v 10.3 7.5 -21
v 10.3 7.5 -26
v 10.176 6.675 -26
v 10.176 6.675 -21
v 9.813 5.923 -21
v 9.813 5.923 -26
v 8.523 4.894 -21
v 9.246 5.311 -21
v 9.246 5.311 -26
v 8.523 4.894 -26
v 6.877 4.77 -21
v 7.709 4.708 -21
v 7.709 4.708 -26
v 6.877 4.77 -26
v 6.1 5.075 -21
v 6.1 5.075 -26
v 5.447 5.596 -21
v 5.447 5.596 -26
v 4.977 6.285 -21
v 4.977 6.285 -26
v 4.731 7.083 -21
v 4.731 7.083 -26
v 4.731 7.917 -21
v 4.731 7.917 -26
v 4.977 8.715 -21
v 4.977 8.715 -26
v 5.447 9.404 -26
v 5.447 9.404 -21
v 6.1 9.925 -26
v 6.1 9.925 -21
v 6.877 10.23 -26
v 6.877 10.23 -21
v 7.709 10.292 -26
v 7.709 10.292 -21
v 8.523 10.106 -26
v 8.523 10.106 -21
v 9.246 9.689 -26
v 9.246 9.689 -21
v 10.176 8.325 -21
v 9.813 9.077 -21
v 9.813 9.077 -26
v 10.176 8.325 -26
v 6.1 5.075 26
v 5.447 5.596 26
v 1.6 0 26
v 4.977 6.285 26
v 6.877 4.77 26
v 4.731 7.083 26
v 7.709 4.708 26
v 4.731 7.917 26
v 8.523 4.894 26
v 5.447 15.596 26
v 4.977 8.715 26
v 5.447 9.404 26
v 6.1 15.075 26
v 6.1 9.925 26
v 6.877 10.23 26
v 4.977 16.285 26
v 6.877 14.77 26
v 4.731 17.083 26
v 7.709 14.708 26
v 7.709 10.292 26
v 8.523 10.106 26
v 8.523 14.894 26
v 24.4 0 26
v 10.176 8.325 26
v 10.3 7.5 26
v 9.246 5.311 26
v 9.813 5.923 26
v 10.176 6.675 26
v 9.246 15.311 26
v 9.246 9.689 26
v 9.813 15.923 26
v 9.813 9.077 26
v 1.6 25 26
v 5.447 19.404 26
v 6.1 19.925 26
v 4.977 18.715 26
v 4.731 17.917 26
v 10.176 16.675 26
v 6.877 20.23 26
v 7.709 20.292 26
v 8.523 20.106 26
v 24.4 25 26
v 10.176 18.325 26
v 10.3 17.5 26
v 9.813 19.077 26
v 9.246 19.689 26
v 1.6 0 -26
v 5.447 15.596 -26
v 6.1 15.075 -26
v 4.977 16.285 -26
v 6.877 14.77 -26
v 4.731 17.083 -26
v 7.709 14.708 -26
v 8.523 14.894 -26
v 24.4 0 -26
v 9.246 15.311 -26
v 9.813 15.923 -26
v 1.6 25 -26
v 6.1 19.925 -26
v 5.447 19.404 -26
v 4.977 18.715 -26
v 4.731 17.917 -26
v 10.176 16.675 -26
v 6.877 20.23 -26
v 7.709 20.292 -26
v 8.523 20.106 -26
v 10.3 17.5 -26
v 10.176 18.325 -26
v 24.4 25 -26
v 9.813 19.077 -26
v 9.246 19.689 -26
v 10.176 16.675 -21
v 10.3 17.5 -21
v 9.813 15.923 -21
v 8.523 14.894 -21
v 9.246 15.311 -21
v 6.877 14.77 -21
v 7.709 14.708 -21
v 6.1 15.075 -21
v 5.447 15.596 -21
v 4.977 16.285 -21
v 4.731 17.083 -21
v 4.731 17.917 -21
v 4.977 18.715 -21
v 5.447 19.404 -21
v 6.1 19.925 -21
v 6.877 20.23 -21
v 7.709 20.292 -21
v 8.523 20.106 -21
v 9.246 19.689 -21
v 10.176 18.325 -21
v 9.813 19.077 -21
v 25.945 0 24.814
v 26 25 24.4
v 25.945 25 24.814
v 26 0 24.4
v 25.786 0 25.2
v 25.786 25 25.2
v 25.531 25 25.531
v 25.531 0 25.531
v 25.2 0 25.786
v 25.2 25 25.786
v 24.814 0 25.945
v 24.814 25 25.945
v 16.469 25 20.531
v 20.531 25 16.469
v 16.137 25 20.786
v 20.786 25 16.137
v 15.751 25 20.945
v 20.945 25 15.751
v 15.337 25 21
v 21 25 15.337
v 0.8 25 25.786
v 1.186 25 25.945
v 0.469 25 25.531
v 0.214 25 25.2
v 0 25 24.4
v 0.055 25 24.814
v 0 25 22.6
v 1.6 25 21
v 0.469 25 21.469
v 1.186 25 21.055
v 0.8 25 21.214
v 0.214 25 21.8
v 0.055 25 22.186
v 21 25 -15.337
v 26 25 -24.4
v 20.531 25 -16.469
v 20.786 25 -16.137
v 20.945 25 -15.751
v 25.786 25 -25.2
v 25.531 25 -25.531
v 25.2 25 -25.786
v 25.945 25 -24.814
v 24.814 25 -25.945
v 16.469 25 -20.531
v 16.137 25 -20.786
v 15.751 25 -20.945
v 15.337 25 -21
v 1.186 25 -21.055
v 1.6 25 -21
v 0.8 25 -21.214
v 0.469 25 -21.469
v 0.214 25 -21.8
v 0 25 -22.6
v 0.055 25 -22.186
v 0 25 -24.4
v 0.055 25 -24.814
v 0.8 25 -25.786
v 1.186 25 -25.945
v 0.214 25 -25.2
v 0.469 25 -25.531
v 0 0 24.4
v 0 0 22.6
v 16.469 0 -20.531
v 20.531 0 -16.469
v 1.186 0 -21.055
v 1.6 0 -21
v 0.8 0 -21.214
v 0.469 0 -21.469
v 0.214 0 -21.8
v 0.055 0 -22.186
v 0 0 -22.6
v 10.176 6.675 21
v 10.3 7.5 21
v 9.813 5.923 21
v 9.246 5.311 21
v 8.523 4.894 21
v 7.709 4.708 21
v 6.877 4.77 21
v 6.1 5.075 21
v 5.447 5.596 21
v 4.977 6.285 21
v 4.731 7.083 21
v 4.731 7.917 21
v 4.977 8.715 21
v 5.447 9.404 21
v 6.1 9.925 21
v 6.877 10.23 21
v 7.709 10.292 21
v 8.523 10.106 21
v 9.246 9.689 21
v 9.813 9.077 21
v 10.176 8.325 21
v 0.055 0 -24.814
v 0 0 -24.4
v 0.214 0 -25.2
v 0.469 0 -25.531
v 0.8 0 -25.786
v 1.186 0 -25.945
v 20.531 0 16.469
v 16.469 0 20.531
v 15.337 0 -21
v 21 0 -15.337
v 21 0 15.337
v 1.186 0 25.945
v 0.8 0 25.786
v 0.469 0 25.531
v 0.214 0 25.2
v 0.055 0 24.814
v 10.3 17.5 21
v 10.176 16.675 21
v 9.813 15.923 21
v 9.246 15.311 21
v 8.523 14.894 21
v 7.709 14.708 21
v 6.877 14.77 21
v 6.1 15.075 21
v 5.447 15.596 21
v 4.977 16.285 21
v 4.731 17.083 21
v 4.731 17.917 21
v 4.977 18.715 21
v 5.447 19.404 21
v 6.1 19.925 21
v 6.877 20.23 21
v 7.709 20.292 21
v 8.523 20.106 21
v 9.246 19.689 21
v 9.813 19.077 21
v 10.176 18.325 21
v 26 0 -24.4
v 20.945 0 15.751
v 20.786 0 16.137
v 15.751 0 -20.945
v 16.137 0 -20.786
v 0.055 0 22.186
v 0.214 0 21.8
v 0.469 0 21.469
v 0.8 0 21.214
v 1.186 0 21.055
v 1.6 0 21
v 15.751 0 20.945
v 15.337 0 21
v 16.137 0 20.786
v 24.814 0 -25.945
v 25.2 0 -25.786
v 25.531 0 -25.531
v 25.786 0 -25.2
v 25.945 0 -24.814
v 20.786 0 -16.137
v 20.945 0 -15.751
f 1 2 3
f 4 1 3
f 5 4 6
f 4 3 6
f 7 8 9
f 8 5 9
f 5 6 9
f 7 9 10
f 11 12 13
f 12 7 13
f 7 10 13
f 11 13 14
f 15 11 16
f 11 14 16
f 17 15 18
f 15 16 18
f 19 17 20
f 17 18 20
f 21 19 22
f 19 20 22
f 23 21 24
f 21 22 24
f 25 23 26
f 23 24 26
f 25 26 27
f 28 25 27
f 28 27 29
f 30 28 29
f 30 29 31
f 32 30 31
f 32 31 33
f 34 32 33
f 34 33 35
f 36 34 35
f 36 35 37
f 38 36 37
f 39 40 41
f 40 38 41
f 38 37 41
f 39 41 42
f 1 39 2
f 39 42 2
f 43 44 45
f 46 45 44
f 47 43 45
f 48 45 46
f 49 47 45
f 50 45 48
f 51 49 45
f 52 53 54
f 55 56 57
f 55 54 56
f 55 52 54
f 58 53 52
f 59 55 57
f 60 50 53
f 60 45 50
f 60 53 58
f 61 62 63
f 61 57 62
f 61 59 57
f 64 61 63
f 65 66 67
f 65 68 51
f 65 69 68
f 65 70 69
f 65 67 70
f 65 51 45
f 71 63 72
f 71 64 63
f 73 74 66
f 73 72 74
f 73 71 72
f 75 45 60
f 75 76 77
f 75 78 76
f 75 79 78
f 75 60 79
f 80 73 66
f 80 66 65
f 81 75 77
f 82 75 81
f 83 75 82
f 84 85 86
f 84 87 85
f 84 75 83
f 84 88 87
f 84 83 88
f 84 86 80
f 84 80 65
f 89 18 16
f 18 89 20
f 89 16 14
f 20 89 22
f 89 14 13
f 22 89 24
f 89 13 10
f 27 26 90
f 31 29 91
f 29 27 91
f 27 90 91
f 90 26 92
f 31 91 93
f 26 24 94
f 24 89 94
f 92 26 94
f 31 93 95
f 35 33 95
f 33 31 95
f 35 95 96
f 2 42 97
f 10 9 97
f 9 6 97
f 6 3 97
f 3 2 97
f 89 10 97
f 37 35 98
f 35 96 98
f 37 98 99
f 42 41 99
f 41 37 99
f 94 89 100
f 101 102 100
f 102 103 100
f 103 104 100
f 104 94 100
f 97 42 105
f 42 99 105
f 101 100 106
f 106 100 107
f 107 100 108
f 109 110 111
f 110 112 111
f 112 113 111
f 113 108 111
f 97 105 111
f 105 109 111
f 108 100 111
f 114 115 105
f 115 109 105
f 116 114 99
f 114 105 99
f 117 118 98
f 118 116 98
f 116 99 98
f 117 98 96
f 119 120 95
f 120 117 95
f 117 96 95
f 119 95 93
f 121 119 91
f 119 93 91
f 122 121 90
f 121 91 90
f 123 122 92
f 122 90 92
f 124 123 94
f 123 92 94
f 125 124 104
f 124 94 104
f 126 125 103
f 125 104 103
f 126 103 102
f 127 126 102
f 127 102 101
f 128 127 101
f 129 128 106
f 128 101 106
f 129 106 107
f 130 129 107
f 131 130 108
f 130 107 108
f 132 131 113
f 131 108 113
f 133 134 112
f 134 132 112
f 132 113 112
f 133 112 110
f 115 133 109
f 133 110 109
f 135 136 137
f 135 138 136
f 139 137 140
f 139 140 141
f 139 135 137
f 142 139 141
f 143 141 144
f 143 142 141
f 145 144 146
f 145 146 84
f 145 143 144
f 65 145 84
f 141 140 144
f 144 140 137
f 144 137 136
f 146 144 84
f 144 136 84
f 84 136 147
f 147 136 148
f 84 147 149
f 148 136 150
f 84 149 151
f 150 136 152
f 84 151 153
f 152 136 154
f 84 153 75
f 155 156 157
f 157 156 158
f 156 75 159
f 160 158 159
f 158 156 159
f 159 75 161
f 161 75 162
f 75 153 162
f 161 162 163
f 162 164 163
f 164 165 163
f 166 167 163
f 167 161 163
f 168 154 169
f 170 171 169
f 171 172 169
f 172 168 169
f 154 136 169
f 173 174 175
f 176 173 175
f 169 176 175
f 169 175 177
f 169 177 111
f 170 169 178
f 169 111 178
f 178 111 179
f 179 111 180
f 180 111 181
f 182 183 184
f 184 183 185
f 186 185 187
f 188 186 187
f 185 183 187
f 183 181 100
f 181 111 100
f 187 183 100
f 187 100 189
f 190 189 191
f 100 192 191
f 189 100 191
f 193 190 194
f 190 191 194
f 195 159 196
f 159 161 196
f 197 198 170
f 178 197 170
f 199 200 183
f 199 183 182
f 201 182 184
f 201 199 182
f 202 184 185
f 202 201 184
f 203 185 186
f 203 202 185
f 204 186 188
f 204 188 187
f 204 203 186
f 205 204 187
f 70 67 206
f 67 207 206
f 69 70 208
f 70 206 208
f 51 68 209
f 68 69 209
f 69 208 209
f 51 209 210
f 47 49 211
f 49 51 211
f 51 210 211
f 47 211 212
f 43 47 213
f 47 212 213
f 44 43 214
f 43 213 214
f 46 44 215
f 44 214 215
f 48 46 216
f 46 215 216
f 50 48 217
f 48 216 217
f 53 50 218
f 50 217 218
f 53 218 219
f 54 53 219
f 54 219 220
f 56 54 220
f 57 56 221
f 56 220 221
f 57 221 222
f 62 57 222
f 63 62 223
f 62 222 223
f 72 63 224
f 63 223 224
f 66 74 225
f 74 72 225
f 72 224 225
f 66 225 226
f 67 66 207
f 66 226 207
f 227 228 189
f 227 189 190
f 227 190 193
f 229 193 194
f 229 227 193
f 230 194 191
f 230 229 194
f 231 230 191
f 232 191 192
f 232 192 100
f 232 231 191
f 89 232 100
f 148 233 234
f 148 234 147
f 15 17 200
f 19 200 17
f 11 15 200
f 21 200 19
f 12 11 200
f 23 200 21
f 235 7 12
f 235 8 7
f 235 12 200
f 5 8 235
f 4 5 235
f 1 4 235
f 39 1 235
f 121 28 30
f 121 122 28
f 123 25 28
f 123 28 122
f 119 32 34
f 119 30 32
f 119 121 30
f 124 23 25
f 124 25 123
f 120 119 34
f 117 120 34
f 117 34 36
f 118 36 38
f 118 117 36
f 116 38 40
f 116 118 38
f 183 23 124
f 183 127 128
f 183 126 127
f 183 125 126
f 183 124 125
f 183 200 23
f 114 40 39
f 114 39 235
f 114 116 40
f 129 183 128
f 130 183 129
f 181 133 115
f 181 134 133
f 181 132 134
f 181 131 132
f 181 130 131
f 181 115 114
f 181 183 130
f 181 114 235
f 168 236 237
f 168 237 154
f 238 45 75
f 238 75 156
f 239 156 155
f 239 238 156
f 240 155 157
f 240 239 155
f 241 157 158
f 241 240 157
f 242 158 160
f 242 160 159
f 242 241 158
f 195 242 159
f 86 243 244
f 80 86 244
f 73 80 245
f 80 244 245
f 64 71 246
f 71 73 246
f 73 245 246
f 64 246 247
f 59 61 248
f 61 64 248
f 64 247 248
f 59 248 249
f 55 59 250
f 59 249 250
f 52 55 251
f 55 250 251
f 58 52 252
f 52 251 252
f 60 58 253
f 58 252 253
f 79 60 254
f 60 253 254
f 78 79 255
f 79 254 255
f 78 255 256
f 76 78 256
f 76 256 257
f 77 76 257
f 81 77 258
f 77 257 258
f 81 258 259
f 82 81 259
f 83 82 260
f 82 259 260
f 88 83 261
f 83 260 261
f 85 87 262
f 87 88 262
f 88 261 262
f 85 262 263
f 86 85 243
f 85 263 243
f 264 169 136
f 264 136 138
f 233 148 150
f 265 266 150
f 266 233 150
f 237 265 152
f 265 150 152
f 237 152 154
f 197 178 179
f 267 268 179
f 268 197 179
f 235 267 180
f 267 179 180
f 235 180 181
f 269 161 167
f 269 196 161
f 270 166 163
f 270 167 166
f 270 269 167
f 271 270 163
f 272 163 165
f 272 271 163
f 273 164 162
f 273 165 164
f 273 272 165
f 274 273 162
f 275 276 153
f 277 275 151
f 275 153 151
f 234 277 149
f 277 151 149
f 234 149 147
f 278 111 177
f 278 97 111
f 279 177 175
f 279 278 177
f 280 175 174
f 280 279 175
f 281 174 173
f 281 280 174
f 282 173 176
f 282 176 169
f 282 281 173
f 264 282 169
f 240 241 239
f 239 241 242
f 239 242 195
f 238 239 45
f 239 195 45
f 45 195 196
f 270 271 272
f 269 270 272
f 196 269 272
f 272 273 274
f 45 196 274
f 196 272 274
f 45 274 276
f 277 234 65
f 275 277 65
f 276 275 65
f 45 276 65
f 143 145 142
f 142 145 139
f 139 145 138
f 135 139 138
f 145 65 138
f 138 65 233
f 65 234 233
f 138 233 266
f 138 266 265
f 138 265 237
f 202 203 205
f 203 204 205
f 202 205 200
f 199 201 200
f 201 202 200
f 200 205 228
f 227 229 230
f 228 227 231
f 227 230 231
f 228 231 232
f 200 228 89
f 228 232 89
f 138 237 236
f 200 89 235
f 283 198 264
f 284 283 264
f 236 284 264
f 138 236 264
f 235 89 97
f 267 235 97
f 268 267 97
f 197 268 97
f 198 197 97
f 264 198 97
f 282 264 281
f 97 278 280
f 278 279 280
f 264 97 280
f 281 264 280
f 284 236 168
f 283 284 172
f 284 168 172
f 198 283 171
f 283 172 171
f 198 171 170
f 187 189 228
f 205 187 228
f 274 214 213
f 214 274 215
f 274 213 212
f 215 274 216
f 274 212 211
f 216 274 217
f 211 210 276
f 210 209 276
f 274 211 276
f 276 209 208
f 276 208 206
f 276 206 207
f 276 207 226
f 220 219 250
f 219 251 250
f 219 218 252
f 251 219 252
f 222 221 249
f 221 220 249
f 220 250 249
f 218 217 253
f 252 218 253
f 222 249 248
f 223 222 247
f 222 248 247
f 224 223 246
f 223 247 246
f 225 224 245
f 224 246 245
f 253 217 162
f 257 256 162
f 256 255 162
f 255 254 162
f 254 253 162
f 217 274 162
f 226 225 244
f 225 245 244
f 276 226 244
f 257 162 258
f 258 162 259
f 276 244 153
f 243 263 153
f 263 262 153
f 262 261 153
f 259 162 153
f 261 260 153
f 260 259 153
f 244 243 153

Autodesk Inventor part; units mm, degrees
ref_plane "YZ Plane" through (0, 0, 0) normal (1, 0, 0) x (0, 1, 0)
ref_plane "XZ Plane" through (0, 0, 0) normal (0, 1, 0) x (-1, 0, 0)
ref_plane "XY Plane" through (0, 0, 0) normal (0, 0, 1) x (1, 0, 0)
sketch "Szkic1" plane through (0, 0, 0) normal (0, 0, 1) x (1, 0, 0)
  line L0 (0, 0) -> (21, 0)
  line L1 (21, 0) -> (21, 25)
  line L2 (21, 25) -> (0, 25)
  line L3 (0, 25) -> (0, 0)
  line L4 (21, 25) -> (26, 25)
  line L5 (26, 25) -> (26, 0)
  line L6 (26, 0) -> (21, 0)
  line L7 (21, 0) -> (21, 25)
  line L8 (0, 12.5) -> (26, 12.5) construction
  circle A0 centre (7.5, 17.5) radius 2.8
  circle A1 centre (7.5, 7.5) radius 2.8
  dimension "d0" = 21
  dimension "d1" = 25
  dimension "d2" = 5
  dimension "d4" = 7.5
  dimension "d5" = 5.6
  dimension "d13" = 10
extrude "Wyciągnięcie proste1" add sketch "Szkic1" along normal mid plane 52
extrude "Wyciągnięcie proste2" cut sketch "Szkic1" along normal mid plane 42 contours L3 L2 L1 L0
chamfer "Faza1" distance 5 angle 45 2 edges at (21, 12.5, 21) (21, 12.5, -21)
fillet "Zaokrąglenie1" radius 1.6 10 edges at (0, 12.5, 26) (0, 12.5, 21) (26, 12.5, 26) (26, 12.5, -26) (0, 12.5, -26) (0, 12.5, -21) (16, 12.5, 21) (21, 12.5, 16) (21, 12.5, -16) (16, 12.5, -21)
properties part number "finger_rig" material "PLA"
